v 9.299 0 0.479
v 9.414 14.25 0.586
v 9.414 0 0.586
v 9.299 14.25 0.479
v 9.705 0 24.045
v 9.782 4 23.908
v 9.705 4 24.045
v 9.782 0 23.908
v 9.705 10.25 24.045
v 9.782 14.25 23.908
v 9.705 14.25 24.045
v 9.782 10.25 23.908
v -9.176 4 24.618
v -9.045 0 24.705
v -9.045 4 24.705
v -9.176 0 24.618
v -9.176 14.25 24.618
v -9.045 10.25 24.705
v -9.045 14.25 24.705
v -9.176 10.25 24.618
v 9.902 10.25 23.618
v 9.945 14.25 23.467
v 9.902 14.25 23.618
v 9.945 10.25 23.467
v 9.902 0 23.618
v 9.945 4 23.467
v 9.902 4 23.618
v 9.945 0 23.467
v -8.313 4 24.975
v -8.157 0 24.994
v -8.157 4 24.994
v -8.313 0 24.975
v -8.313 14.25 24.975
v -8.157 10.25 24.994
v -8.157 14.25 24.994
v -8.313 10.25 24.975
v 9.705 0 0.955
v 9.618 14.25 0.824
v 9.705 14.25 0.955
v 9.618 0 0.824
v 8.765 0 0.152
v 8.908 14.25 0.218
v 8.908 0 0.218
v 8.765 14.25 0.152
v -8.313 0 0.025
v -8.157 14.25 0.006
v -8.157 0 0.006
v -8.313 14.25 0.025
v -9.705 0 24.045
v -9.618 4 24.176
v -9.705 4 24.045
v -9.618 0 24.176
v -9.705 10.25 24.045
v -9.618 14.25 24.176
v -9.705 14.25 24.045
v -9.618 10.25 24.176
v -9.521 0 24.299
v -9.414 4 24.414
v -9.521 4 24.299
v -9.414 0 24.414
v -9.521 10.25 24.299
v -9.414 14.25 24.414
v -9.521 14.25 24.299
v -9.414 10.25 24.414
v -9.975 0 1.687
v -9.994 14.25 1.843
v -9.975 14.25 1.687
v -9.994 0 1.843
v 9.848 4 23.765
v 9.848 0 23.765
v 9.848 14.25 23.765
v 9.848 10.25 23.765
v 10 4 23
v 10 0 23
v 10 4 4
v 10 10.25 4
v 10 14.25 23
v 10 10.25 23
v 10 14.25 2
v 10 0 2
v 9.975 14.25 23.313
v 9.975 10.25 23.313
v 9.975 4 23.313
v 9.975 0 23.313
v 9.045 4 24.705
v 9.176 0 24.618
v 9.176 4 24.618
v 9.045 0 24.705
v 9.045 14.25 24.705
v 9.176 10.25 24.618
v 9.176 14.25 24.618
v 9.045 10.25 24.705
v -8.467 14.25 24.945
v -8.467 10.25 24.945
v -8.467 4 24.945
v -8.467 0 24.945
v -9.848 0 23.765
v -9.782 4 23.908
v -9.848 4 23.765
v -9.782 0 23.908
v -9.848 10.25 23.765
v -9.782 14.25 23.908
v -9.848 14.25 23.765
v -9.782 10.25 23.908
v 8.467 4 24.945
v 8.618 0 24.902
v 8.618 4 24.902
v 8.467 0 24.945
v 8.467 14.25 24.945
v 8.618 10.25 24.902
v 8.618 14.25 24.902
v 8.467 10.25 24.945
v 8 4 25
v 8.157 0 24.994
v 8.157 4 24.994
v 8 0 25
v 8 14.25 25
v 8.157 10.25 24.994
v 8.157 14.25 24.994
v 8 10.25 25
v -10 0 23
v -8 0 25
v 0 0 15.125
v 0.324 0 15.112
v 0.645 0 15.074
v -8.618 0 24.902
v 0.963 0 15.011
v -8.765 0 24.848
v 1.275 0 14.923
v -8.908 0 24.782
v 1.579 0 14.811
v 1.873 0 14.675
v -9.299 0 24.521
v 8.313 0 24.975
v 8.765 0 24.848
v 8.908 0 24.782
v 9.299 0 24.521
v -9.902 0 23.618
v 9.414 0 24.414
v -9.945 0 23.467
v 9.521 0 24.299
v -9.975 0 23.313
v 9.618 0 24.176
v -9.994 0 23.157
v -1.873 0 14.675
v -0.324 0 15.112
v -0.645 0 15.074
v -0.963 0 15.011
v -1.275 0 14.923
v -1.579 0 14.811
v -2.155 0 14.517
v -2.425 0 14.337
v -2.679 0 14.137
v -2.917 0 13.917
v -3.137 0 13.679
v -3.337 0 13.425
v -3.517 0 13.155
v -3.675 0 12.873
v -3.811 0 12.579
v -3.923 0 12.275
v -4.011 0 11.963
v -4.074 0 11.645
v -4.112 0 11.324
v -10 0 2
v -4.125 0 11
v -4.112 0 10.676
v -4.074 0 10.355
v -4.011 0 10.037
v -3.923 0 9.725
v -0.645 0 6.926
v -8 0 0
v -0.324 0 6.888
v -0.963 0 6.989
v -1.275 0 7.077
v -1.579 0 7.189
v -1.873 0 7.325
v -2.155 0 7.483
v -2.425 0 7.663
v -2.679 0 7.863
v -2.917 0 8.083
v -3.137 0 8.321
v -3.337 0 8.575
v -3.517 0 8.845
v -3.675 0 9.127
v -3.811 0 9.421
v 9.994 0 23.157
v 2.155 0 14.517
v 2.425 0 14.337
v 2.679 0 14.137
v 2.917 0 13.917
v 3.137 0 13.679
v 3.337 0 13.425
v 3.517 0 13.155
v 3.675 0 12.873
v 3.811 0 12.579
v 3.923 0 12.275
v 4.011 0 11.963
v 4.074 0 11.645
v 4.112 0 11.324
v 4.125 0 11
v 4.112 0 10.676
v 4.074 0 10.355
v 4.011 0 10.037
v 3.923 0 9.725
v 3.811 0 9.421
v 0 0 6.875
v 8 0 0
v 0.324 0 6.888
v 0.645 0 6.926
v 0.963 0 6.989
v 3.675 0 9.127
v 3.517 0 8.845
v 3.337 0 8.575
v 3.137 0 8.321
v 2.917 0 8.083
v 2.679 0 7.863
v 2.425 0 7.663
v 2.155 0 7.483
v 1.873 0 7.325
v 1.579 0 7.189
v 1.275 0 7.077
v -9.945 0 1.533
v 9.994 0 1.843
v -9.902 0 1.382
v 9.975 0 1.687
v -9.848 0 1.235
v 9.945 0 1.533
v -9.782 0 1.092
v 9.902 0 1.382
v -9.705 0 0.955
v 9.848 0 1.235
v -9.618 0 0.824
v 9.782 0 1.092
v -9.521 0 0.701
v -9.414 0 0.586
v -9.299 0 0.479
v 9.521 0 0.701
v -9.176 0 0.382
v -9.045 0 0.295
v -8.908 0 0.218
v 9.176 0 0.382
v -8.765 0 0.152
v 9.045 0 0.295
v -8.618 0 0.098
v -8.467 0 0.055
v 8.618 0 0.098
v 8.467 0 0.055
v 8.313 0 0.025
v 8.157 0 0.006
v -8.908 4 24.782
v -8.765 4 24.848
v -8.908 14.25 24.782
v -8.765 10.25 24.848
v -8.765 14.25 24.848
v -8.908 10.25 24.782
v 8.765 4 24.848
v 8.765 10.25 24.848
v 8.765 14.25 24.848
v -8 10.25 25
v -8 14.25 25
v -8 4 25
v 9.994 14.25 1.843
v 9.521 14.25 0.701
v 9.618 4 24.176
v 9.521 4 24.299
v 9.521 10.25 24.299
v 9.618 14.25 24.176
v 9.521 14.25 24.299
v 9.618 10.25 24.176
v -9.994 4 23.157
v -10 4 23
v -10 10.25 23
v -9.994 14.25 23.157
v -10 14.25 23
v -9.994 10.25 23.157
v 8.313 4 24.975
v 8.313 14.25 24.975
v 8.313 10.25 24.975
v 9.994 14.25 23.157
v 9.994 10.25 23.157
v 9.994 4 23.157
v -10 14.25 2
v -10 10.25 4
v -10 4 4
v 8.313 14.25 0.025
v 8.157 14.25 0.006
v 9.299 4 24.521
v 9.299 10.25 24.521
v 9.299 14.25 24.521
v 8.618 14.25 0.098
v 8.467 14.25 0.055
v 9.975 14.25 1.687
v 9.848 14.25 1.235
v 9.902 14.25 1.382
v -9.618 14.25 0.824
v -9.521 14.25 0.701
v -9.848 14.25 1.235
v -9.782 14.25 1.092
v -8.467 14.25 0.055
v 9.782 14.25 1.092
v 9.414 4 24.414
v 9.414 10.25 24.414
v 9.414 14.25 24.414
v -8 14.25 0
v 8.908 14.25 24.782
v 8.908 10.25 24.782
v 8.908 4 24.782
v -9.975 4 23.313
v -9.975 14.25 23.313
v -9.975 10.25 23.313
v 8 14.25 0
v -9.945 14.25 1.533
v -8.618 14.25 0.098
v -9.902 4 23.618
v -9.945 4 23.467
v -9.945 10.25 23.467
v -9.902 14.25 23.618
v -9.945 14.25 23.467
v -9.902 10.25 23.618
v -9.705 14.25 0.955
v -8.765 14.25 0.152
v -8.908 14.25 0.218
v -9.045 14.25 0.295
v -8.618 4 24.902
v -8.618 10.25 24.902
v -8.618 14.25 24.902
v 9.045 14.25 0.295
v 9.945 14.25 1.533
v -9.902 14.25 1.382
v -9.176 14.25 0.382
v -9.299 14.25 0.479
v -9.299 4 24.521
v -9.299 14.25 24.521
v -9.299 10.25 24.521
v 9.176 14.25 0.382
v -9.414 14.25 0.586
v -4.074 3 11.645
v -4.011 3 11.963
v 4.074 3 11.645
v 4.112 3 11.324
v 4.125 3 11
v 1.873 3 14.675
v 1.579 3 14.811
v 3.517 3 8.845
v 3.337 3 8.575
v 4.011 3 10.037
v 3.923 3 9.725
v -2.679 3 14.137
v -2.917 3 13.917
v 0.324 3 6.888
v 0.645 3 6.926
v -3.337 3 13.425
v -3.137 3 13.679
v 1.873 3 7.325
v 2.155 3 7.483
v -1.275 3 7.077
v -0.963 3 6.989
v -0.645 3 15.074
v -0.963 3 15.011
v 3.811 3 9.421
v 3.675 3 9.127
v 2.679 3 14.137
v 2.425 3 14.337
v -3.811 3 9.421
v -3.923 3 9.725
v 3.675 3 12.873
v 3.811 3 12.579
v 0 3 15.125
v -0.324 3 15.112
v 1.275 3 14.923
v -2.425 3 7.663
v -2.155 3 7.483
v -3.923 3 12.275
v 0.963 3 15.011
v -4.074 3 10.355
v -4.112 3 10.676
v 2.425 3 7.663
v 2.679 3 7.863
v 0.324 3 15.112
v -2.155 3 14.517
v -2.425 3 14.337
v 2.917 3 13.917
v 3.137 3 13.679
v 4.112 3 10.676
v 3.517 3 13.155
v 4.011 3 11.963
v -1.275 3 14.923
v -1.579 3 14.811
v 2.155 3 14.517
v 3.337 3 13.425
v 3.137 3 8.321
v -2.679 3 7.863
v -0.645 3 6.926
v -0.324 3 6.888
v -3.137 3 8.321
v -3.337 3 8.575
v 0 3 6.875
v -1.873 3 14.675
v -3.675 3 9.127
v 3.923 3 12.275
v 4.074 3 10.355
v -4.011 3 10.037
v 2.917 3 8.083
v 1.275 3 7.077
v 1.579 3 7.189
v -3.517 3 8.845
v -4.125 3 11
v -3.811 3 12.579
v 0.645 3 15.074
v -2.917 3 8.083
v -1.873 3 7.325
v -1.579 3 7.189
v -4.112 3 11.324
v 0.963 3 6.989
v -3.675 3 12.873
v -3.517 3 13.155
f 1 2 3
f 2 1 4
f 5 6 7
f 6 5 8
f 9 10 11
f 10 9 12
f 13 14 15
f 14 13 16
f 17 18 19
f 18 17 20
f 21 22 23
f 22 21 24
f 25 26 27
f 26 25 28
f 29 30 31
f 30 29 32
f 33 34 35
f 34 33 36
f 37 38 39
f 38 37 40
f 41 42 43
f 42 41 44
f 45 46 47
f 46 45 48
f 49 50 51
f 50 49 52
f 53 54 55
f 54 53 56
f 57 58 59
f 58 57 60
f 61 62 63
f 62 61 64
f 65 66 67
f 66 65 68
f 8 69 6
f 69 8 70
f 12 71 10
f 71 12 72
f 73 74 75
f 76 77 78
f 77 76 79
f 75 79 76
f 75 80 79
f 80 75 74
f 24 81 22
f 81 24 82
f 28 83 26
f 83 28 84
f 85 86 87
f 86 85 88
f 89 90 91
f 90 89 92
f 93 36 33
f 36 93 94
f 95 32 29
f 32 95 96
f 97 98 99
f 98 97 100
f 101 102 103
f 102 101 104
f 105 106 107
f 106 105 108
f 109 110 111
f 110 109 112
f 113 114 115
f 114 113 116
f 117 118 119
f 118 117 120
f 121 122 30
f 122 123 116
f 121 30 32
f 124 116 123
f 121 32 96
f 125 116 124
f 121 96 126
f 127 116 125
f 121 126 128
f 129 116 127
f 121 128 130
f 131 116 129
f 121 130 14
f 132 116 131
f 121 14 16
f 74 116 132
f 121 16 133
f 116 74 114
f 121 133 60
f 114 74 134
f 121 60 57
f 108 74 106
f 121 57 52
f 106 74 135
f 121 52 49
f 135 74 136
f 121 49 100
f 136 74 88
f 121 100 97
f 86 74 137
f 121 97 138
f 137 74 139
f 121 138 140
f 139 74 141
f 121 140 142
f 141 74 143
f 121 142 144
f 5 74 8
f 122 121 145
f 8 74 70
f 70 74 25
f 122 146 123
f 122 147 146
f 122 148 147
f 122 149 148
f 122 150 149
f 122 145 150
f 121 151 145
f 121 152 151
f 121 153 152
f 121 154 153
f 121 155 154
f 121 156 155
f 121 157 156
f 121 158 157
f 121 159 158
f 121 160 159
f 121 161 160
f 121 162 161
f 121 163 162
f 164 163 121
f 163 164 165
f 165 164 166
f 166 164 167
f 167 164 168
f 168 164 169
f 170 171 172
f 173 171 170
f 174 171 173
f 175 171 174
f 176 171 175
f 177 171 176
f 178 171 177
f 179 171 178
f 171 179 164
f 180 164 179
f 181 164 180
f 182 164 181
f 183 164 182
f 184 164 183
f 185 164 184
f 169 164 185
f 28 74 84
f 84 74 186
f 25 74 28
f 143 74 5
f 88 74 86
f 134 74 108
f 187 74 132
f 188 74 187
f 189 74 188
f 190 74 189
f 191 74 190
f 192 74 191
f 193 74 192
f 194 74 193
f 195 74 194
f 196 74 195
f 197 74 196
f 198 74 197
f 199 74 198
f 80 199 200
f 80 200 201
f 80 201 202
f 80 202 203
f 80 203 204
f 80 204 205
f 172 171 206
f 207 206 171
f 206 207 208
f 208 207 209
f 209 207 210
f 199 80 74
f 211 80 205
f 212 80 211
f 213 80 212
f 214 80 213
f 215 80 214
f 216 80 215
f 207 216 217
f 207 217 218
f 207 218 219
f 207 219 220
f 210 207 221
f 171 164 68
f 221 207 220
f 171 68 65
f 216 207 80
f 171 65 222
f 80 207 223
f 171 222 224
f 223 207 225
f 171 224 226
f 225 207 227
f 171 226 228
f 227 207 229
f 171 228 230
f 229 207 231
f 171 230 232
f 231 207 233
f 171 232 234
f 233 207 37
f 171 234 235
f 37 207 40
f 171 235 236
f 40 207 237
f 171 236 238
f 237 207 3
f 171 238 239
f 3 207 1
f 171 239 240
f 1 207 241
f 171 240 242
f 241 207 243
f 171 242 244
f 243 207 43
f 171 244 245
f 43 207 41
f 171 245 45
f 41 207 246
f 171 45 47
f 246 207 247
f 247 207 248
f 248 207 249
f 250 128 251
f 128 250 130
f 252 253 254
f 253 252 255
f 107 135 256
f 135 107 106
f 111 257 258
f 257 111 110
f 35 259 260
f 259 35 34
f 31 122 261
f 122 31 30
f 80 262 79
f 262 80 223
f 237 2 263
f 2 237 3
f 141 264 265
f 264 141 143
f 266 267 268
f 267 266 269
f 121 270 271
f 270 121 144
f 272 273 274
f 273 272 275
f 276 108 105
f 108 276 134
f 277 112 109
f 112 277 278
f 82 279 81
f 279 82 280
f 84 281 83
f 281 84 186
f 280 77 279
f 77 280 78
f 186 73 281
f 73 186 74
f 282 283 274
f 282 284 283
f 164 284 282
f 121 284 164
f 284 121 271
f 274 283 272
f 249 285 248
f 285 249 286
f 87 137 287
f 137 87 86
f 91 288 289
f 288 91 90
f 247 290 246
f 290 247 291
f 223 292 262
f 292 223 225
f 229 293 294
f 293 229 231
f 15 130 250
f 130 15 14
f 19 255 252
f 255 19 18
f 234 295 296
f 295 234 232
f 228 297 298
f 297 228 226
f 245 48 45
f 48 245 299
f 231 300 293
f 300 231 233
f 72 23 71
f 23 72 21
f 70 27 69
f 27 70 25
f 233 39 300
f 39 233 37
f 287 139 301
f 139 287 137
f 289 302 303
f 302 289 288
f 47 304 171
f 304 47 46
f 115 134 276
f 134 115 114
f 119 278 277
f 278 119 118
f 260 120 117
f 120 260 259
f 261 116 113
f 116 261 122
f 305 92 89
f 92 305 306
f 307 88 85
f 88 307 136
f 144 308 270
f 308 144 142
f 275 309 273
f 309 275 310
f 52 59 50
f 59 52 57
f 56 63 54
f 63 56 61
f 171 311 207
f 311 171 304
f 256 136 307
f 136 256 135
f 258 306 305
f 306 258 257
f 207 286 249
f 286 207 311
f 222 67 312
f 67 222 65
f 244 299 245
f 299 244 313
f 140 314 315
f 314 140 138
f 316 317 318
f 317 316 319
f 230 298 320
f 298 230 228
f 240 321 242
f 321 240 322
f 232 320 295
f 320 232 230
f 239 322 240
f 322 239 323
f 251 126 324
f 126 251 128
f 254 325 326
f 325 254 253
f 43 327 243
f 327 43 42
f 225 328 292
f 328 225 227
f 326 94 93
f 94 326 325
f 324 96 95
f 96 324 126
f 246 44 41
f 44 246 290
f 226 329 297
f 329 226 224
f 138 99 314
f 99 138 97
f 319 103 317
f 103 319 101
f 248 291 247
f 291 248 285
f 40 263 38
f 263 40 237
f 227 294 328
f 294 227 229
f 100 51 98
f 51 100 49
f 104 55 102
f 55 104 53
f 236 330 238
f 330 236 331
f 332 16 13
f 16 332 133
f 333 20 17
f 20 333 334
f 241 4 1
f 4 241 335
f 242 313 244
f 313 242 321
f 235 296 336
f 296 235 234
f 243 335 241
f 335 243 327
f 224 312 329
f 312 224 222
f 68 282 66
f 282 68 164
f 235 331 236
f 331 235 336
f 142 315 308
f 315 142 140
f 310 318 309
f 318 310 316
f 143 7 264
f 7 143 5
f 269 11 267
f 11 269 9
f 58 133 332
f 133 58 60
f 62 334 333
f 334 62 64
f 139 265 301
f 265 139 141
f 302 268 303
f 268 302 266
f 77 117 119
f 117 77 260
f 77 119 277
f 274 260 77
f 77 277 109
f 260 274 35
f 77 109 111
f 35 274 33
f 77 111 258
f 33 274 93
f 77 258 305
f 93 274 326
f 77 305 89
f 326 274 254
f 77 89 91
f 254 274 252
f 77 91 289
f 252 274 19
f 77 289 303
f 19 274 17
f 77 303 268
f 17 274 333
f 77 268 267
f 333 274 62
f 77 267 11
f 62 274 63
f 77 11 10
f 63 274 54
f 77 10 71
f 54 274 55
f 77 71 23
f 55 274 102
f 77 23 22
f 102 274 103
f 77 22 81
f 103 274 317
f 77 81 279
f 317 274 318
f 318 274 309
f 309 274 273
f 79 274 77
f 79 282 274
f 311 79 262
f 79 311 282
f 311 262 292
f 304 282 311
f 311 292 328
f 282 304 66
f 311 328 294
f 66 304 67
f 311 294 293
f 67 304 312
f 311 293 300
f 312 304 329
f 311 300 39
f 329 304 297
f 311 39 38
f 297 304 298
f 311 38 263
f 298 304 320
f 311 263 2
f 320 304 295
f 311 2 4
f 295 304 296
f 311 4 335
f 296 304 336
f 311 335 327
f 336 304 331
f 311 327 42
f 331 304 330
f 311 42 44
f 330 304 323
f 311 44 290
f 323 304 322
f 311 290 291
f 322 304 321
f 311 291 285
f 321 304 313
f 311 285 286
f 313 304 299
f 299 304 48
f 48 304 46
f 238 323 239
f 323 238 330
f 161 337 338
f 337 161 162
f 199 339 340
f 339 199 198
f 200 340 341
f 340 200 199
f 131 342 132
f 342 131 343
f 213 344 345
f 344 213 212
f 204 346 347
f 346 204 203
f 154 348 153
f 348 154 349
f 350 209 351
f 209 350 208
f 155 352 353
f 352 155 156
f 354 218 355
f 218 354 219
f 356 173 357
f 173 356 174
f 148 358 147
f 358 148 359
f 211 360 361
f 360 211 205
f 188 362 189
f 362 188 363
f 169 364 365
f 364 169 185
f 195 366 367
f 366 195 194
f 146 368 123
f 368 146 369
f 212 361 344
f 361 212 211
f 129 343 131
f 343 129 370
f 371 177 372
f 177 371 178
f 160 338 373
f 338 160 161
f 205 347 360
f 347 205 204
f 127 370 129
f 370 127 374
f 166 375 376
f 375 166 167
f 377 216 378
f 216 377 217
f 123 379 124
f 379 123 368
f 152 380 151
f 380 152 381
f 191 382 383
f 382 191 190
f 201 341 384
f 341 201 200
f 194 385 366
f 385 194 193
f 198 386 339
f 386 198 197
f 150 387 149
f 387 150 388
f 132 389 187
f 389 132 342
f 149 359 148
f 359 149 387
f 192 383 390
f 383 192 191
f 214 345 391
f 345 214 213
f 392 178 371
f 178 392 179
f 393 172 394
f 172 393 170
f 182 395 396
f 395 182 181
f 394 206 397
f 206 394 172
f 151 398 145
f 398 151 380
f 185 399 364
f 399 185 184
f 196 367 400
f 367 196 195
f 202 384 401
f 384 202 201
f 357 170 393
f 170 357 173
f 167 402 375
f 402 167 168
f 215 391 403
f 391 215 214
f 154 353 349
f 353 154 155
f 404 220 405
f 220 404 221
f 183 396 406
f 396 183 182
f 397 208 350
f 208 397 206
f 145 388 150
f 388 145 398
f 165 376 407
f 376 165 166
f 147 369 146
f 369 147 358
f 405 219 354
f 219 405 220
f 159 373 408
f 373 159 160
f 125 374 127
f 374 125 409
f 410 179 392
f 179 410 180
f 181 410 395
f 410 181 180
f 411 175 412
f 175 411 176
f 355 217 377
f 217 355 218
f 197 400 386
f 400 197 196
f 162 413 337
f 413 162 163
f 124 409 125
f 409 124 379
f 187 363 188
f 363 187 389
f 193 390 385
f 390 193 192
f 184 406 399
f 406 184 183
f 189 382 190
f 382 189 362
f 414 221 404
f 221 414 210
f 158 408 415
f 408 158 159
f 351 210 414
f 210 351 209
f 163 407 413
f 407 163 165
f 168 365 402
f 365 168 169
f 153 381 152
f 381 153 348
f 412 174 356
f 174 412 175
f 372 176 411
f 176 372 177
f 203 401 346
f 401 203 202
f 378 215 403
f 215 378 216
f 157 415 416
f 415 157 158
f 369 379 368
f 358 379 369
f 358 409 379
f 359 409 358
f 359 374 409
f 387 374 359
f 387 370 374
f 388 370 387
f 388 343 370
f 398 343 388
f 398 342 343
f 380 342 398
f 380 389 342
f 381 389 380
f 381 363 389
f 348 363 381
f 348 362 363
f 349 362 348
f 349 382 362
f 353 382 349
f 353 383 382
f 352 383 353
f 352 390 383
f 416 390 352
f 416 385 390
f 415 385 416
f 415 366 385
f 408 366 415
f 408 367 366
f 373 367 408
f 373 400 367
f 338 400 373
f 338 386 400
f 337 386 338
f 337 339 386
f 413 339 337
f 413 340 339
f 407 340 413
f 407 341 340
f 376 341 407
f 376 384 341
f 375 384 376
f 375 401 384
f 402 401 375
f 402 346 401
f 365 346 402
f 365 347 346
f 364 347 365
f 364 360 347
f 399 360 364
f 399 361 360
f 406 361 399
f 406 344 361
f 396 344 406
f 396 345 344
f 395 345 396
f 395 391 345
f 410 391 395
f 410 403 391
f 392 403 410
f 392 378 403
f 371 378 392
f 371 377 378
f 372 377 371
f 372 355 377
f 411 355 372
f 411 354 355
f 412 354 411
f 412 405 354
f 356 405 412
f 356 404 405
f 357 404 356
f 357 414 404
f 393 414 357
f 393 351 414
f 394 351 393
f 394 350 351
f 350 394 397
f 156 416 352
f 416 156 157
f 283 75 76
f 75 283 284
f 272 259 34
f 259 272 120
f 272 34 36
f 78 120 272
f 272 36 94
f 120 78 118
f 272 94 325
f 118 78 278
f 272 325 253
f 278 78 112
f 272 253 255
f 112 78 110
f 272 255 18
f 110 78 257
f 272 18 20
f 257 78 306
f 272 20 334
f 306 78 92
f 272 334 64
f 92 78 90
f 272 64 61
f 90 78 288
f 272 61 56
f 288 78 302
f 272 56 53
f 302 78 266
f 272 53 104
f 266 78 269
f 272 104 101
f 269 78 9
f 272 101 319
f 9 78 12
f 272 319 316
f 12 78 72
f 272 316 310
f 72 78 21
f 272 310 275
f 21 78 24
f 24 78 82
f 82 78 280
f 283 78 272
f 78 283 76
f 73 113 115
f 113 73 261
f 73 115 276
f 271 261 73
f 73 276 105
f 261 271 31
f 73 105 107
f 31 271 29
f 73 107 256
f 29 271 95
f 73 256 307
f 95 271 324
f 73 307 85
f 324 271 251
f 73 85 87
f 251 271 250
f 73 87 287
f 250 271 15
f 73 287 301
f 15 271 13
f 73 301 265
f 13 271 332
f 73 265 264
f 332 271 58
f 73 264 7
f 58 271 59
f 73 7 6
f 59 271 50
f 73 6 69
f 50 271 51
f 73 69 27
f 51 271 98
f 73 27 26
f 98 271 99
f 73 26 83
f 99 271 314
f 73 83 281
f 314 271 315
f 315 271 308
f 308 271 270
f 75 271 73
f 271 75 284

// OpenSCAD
$fn=80;

bottomLip = 0;
thick = 4; /* minimum 4 */
gap = 6.25;
magnetDepth = 3;
magnetDia = 8.25; /* include any slop */
len = 25;


/* note: need 4mm of thickness of form for 10mm bolts to work */
/* note: this file is a total mess. not sure how it got to this point. */

difference() {
   translate([-8,0,2]) hull() {
      totalThick = 2*thick + gap;
      translate([16,0,0]) rotate([-90,0,0]) cylinder(r=2,h=totalThick);
      translate([0,0,0]) rotate([-90,0,0]) cylinder(r=2,h=totalThick);
      translate([16,0,len-4 + 2*bottomLip ]) rotate([-90,0,0]) cylinder(r=2,h=totalThick);
      translate([0,0, len-4 + 2*bottomLip]) rotate([-90,0,0]) cylinder(r=2,h=totalThick);
   }

   /* cutout for magnet */
   translate([0,magnetDepth, 11]) rotate([90,0,0]) cylinder(d=magnetDia, h=20);

   translate([-12.5,thick,4]) cube([25,gap,len]);
}
